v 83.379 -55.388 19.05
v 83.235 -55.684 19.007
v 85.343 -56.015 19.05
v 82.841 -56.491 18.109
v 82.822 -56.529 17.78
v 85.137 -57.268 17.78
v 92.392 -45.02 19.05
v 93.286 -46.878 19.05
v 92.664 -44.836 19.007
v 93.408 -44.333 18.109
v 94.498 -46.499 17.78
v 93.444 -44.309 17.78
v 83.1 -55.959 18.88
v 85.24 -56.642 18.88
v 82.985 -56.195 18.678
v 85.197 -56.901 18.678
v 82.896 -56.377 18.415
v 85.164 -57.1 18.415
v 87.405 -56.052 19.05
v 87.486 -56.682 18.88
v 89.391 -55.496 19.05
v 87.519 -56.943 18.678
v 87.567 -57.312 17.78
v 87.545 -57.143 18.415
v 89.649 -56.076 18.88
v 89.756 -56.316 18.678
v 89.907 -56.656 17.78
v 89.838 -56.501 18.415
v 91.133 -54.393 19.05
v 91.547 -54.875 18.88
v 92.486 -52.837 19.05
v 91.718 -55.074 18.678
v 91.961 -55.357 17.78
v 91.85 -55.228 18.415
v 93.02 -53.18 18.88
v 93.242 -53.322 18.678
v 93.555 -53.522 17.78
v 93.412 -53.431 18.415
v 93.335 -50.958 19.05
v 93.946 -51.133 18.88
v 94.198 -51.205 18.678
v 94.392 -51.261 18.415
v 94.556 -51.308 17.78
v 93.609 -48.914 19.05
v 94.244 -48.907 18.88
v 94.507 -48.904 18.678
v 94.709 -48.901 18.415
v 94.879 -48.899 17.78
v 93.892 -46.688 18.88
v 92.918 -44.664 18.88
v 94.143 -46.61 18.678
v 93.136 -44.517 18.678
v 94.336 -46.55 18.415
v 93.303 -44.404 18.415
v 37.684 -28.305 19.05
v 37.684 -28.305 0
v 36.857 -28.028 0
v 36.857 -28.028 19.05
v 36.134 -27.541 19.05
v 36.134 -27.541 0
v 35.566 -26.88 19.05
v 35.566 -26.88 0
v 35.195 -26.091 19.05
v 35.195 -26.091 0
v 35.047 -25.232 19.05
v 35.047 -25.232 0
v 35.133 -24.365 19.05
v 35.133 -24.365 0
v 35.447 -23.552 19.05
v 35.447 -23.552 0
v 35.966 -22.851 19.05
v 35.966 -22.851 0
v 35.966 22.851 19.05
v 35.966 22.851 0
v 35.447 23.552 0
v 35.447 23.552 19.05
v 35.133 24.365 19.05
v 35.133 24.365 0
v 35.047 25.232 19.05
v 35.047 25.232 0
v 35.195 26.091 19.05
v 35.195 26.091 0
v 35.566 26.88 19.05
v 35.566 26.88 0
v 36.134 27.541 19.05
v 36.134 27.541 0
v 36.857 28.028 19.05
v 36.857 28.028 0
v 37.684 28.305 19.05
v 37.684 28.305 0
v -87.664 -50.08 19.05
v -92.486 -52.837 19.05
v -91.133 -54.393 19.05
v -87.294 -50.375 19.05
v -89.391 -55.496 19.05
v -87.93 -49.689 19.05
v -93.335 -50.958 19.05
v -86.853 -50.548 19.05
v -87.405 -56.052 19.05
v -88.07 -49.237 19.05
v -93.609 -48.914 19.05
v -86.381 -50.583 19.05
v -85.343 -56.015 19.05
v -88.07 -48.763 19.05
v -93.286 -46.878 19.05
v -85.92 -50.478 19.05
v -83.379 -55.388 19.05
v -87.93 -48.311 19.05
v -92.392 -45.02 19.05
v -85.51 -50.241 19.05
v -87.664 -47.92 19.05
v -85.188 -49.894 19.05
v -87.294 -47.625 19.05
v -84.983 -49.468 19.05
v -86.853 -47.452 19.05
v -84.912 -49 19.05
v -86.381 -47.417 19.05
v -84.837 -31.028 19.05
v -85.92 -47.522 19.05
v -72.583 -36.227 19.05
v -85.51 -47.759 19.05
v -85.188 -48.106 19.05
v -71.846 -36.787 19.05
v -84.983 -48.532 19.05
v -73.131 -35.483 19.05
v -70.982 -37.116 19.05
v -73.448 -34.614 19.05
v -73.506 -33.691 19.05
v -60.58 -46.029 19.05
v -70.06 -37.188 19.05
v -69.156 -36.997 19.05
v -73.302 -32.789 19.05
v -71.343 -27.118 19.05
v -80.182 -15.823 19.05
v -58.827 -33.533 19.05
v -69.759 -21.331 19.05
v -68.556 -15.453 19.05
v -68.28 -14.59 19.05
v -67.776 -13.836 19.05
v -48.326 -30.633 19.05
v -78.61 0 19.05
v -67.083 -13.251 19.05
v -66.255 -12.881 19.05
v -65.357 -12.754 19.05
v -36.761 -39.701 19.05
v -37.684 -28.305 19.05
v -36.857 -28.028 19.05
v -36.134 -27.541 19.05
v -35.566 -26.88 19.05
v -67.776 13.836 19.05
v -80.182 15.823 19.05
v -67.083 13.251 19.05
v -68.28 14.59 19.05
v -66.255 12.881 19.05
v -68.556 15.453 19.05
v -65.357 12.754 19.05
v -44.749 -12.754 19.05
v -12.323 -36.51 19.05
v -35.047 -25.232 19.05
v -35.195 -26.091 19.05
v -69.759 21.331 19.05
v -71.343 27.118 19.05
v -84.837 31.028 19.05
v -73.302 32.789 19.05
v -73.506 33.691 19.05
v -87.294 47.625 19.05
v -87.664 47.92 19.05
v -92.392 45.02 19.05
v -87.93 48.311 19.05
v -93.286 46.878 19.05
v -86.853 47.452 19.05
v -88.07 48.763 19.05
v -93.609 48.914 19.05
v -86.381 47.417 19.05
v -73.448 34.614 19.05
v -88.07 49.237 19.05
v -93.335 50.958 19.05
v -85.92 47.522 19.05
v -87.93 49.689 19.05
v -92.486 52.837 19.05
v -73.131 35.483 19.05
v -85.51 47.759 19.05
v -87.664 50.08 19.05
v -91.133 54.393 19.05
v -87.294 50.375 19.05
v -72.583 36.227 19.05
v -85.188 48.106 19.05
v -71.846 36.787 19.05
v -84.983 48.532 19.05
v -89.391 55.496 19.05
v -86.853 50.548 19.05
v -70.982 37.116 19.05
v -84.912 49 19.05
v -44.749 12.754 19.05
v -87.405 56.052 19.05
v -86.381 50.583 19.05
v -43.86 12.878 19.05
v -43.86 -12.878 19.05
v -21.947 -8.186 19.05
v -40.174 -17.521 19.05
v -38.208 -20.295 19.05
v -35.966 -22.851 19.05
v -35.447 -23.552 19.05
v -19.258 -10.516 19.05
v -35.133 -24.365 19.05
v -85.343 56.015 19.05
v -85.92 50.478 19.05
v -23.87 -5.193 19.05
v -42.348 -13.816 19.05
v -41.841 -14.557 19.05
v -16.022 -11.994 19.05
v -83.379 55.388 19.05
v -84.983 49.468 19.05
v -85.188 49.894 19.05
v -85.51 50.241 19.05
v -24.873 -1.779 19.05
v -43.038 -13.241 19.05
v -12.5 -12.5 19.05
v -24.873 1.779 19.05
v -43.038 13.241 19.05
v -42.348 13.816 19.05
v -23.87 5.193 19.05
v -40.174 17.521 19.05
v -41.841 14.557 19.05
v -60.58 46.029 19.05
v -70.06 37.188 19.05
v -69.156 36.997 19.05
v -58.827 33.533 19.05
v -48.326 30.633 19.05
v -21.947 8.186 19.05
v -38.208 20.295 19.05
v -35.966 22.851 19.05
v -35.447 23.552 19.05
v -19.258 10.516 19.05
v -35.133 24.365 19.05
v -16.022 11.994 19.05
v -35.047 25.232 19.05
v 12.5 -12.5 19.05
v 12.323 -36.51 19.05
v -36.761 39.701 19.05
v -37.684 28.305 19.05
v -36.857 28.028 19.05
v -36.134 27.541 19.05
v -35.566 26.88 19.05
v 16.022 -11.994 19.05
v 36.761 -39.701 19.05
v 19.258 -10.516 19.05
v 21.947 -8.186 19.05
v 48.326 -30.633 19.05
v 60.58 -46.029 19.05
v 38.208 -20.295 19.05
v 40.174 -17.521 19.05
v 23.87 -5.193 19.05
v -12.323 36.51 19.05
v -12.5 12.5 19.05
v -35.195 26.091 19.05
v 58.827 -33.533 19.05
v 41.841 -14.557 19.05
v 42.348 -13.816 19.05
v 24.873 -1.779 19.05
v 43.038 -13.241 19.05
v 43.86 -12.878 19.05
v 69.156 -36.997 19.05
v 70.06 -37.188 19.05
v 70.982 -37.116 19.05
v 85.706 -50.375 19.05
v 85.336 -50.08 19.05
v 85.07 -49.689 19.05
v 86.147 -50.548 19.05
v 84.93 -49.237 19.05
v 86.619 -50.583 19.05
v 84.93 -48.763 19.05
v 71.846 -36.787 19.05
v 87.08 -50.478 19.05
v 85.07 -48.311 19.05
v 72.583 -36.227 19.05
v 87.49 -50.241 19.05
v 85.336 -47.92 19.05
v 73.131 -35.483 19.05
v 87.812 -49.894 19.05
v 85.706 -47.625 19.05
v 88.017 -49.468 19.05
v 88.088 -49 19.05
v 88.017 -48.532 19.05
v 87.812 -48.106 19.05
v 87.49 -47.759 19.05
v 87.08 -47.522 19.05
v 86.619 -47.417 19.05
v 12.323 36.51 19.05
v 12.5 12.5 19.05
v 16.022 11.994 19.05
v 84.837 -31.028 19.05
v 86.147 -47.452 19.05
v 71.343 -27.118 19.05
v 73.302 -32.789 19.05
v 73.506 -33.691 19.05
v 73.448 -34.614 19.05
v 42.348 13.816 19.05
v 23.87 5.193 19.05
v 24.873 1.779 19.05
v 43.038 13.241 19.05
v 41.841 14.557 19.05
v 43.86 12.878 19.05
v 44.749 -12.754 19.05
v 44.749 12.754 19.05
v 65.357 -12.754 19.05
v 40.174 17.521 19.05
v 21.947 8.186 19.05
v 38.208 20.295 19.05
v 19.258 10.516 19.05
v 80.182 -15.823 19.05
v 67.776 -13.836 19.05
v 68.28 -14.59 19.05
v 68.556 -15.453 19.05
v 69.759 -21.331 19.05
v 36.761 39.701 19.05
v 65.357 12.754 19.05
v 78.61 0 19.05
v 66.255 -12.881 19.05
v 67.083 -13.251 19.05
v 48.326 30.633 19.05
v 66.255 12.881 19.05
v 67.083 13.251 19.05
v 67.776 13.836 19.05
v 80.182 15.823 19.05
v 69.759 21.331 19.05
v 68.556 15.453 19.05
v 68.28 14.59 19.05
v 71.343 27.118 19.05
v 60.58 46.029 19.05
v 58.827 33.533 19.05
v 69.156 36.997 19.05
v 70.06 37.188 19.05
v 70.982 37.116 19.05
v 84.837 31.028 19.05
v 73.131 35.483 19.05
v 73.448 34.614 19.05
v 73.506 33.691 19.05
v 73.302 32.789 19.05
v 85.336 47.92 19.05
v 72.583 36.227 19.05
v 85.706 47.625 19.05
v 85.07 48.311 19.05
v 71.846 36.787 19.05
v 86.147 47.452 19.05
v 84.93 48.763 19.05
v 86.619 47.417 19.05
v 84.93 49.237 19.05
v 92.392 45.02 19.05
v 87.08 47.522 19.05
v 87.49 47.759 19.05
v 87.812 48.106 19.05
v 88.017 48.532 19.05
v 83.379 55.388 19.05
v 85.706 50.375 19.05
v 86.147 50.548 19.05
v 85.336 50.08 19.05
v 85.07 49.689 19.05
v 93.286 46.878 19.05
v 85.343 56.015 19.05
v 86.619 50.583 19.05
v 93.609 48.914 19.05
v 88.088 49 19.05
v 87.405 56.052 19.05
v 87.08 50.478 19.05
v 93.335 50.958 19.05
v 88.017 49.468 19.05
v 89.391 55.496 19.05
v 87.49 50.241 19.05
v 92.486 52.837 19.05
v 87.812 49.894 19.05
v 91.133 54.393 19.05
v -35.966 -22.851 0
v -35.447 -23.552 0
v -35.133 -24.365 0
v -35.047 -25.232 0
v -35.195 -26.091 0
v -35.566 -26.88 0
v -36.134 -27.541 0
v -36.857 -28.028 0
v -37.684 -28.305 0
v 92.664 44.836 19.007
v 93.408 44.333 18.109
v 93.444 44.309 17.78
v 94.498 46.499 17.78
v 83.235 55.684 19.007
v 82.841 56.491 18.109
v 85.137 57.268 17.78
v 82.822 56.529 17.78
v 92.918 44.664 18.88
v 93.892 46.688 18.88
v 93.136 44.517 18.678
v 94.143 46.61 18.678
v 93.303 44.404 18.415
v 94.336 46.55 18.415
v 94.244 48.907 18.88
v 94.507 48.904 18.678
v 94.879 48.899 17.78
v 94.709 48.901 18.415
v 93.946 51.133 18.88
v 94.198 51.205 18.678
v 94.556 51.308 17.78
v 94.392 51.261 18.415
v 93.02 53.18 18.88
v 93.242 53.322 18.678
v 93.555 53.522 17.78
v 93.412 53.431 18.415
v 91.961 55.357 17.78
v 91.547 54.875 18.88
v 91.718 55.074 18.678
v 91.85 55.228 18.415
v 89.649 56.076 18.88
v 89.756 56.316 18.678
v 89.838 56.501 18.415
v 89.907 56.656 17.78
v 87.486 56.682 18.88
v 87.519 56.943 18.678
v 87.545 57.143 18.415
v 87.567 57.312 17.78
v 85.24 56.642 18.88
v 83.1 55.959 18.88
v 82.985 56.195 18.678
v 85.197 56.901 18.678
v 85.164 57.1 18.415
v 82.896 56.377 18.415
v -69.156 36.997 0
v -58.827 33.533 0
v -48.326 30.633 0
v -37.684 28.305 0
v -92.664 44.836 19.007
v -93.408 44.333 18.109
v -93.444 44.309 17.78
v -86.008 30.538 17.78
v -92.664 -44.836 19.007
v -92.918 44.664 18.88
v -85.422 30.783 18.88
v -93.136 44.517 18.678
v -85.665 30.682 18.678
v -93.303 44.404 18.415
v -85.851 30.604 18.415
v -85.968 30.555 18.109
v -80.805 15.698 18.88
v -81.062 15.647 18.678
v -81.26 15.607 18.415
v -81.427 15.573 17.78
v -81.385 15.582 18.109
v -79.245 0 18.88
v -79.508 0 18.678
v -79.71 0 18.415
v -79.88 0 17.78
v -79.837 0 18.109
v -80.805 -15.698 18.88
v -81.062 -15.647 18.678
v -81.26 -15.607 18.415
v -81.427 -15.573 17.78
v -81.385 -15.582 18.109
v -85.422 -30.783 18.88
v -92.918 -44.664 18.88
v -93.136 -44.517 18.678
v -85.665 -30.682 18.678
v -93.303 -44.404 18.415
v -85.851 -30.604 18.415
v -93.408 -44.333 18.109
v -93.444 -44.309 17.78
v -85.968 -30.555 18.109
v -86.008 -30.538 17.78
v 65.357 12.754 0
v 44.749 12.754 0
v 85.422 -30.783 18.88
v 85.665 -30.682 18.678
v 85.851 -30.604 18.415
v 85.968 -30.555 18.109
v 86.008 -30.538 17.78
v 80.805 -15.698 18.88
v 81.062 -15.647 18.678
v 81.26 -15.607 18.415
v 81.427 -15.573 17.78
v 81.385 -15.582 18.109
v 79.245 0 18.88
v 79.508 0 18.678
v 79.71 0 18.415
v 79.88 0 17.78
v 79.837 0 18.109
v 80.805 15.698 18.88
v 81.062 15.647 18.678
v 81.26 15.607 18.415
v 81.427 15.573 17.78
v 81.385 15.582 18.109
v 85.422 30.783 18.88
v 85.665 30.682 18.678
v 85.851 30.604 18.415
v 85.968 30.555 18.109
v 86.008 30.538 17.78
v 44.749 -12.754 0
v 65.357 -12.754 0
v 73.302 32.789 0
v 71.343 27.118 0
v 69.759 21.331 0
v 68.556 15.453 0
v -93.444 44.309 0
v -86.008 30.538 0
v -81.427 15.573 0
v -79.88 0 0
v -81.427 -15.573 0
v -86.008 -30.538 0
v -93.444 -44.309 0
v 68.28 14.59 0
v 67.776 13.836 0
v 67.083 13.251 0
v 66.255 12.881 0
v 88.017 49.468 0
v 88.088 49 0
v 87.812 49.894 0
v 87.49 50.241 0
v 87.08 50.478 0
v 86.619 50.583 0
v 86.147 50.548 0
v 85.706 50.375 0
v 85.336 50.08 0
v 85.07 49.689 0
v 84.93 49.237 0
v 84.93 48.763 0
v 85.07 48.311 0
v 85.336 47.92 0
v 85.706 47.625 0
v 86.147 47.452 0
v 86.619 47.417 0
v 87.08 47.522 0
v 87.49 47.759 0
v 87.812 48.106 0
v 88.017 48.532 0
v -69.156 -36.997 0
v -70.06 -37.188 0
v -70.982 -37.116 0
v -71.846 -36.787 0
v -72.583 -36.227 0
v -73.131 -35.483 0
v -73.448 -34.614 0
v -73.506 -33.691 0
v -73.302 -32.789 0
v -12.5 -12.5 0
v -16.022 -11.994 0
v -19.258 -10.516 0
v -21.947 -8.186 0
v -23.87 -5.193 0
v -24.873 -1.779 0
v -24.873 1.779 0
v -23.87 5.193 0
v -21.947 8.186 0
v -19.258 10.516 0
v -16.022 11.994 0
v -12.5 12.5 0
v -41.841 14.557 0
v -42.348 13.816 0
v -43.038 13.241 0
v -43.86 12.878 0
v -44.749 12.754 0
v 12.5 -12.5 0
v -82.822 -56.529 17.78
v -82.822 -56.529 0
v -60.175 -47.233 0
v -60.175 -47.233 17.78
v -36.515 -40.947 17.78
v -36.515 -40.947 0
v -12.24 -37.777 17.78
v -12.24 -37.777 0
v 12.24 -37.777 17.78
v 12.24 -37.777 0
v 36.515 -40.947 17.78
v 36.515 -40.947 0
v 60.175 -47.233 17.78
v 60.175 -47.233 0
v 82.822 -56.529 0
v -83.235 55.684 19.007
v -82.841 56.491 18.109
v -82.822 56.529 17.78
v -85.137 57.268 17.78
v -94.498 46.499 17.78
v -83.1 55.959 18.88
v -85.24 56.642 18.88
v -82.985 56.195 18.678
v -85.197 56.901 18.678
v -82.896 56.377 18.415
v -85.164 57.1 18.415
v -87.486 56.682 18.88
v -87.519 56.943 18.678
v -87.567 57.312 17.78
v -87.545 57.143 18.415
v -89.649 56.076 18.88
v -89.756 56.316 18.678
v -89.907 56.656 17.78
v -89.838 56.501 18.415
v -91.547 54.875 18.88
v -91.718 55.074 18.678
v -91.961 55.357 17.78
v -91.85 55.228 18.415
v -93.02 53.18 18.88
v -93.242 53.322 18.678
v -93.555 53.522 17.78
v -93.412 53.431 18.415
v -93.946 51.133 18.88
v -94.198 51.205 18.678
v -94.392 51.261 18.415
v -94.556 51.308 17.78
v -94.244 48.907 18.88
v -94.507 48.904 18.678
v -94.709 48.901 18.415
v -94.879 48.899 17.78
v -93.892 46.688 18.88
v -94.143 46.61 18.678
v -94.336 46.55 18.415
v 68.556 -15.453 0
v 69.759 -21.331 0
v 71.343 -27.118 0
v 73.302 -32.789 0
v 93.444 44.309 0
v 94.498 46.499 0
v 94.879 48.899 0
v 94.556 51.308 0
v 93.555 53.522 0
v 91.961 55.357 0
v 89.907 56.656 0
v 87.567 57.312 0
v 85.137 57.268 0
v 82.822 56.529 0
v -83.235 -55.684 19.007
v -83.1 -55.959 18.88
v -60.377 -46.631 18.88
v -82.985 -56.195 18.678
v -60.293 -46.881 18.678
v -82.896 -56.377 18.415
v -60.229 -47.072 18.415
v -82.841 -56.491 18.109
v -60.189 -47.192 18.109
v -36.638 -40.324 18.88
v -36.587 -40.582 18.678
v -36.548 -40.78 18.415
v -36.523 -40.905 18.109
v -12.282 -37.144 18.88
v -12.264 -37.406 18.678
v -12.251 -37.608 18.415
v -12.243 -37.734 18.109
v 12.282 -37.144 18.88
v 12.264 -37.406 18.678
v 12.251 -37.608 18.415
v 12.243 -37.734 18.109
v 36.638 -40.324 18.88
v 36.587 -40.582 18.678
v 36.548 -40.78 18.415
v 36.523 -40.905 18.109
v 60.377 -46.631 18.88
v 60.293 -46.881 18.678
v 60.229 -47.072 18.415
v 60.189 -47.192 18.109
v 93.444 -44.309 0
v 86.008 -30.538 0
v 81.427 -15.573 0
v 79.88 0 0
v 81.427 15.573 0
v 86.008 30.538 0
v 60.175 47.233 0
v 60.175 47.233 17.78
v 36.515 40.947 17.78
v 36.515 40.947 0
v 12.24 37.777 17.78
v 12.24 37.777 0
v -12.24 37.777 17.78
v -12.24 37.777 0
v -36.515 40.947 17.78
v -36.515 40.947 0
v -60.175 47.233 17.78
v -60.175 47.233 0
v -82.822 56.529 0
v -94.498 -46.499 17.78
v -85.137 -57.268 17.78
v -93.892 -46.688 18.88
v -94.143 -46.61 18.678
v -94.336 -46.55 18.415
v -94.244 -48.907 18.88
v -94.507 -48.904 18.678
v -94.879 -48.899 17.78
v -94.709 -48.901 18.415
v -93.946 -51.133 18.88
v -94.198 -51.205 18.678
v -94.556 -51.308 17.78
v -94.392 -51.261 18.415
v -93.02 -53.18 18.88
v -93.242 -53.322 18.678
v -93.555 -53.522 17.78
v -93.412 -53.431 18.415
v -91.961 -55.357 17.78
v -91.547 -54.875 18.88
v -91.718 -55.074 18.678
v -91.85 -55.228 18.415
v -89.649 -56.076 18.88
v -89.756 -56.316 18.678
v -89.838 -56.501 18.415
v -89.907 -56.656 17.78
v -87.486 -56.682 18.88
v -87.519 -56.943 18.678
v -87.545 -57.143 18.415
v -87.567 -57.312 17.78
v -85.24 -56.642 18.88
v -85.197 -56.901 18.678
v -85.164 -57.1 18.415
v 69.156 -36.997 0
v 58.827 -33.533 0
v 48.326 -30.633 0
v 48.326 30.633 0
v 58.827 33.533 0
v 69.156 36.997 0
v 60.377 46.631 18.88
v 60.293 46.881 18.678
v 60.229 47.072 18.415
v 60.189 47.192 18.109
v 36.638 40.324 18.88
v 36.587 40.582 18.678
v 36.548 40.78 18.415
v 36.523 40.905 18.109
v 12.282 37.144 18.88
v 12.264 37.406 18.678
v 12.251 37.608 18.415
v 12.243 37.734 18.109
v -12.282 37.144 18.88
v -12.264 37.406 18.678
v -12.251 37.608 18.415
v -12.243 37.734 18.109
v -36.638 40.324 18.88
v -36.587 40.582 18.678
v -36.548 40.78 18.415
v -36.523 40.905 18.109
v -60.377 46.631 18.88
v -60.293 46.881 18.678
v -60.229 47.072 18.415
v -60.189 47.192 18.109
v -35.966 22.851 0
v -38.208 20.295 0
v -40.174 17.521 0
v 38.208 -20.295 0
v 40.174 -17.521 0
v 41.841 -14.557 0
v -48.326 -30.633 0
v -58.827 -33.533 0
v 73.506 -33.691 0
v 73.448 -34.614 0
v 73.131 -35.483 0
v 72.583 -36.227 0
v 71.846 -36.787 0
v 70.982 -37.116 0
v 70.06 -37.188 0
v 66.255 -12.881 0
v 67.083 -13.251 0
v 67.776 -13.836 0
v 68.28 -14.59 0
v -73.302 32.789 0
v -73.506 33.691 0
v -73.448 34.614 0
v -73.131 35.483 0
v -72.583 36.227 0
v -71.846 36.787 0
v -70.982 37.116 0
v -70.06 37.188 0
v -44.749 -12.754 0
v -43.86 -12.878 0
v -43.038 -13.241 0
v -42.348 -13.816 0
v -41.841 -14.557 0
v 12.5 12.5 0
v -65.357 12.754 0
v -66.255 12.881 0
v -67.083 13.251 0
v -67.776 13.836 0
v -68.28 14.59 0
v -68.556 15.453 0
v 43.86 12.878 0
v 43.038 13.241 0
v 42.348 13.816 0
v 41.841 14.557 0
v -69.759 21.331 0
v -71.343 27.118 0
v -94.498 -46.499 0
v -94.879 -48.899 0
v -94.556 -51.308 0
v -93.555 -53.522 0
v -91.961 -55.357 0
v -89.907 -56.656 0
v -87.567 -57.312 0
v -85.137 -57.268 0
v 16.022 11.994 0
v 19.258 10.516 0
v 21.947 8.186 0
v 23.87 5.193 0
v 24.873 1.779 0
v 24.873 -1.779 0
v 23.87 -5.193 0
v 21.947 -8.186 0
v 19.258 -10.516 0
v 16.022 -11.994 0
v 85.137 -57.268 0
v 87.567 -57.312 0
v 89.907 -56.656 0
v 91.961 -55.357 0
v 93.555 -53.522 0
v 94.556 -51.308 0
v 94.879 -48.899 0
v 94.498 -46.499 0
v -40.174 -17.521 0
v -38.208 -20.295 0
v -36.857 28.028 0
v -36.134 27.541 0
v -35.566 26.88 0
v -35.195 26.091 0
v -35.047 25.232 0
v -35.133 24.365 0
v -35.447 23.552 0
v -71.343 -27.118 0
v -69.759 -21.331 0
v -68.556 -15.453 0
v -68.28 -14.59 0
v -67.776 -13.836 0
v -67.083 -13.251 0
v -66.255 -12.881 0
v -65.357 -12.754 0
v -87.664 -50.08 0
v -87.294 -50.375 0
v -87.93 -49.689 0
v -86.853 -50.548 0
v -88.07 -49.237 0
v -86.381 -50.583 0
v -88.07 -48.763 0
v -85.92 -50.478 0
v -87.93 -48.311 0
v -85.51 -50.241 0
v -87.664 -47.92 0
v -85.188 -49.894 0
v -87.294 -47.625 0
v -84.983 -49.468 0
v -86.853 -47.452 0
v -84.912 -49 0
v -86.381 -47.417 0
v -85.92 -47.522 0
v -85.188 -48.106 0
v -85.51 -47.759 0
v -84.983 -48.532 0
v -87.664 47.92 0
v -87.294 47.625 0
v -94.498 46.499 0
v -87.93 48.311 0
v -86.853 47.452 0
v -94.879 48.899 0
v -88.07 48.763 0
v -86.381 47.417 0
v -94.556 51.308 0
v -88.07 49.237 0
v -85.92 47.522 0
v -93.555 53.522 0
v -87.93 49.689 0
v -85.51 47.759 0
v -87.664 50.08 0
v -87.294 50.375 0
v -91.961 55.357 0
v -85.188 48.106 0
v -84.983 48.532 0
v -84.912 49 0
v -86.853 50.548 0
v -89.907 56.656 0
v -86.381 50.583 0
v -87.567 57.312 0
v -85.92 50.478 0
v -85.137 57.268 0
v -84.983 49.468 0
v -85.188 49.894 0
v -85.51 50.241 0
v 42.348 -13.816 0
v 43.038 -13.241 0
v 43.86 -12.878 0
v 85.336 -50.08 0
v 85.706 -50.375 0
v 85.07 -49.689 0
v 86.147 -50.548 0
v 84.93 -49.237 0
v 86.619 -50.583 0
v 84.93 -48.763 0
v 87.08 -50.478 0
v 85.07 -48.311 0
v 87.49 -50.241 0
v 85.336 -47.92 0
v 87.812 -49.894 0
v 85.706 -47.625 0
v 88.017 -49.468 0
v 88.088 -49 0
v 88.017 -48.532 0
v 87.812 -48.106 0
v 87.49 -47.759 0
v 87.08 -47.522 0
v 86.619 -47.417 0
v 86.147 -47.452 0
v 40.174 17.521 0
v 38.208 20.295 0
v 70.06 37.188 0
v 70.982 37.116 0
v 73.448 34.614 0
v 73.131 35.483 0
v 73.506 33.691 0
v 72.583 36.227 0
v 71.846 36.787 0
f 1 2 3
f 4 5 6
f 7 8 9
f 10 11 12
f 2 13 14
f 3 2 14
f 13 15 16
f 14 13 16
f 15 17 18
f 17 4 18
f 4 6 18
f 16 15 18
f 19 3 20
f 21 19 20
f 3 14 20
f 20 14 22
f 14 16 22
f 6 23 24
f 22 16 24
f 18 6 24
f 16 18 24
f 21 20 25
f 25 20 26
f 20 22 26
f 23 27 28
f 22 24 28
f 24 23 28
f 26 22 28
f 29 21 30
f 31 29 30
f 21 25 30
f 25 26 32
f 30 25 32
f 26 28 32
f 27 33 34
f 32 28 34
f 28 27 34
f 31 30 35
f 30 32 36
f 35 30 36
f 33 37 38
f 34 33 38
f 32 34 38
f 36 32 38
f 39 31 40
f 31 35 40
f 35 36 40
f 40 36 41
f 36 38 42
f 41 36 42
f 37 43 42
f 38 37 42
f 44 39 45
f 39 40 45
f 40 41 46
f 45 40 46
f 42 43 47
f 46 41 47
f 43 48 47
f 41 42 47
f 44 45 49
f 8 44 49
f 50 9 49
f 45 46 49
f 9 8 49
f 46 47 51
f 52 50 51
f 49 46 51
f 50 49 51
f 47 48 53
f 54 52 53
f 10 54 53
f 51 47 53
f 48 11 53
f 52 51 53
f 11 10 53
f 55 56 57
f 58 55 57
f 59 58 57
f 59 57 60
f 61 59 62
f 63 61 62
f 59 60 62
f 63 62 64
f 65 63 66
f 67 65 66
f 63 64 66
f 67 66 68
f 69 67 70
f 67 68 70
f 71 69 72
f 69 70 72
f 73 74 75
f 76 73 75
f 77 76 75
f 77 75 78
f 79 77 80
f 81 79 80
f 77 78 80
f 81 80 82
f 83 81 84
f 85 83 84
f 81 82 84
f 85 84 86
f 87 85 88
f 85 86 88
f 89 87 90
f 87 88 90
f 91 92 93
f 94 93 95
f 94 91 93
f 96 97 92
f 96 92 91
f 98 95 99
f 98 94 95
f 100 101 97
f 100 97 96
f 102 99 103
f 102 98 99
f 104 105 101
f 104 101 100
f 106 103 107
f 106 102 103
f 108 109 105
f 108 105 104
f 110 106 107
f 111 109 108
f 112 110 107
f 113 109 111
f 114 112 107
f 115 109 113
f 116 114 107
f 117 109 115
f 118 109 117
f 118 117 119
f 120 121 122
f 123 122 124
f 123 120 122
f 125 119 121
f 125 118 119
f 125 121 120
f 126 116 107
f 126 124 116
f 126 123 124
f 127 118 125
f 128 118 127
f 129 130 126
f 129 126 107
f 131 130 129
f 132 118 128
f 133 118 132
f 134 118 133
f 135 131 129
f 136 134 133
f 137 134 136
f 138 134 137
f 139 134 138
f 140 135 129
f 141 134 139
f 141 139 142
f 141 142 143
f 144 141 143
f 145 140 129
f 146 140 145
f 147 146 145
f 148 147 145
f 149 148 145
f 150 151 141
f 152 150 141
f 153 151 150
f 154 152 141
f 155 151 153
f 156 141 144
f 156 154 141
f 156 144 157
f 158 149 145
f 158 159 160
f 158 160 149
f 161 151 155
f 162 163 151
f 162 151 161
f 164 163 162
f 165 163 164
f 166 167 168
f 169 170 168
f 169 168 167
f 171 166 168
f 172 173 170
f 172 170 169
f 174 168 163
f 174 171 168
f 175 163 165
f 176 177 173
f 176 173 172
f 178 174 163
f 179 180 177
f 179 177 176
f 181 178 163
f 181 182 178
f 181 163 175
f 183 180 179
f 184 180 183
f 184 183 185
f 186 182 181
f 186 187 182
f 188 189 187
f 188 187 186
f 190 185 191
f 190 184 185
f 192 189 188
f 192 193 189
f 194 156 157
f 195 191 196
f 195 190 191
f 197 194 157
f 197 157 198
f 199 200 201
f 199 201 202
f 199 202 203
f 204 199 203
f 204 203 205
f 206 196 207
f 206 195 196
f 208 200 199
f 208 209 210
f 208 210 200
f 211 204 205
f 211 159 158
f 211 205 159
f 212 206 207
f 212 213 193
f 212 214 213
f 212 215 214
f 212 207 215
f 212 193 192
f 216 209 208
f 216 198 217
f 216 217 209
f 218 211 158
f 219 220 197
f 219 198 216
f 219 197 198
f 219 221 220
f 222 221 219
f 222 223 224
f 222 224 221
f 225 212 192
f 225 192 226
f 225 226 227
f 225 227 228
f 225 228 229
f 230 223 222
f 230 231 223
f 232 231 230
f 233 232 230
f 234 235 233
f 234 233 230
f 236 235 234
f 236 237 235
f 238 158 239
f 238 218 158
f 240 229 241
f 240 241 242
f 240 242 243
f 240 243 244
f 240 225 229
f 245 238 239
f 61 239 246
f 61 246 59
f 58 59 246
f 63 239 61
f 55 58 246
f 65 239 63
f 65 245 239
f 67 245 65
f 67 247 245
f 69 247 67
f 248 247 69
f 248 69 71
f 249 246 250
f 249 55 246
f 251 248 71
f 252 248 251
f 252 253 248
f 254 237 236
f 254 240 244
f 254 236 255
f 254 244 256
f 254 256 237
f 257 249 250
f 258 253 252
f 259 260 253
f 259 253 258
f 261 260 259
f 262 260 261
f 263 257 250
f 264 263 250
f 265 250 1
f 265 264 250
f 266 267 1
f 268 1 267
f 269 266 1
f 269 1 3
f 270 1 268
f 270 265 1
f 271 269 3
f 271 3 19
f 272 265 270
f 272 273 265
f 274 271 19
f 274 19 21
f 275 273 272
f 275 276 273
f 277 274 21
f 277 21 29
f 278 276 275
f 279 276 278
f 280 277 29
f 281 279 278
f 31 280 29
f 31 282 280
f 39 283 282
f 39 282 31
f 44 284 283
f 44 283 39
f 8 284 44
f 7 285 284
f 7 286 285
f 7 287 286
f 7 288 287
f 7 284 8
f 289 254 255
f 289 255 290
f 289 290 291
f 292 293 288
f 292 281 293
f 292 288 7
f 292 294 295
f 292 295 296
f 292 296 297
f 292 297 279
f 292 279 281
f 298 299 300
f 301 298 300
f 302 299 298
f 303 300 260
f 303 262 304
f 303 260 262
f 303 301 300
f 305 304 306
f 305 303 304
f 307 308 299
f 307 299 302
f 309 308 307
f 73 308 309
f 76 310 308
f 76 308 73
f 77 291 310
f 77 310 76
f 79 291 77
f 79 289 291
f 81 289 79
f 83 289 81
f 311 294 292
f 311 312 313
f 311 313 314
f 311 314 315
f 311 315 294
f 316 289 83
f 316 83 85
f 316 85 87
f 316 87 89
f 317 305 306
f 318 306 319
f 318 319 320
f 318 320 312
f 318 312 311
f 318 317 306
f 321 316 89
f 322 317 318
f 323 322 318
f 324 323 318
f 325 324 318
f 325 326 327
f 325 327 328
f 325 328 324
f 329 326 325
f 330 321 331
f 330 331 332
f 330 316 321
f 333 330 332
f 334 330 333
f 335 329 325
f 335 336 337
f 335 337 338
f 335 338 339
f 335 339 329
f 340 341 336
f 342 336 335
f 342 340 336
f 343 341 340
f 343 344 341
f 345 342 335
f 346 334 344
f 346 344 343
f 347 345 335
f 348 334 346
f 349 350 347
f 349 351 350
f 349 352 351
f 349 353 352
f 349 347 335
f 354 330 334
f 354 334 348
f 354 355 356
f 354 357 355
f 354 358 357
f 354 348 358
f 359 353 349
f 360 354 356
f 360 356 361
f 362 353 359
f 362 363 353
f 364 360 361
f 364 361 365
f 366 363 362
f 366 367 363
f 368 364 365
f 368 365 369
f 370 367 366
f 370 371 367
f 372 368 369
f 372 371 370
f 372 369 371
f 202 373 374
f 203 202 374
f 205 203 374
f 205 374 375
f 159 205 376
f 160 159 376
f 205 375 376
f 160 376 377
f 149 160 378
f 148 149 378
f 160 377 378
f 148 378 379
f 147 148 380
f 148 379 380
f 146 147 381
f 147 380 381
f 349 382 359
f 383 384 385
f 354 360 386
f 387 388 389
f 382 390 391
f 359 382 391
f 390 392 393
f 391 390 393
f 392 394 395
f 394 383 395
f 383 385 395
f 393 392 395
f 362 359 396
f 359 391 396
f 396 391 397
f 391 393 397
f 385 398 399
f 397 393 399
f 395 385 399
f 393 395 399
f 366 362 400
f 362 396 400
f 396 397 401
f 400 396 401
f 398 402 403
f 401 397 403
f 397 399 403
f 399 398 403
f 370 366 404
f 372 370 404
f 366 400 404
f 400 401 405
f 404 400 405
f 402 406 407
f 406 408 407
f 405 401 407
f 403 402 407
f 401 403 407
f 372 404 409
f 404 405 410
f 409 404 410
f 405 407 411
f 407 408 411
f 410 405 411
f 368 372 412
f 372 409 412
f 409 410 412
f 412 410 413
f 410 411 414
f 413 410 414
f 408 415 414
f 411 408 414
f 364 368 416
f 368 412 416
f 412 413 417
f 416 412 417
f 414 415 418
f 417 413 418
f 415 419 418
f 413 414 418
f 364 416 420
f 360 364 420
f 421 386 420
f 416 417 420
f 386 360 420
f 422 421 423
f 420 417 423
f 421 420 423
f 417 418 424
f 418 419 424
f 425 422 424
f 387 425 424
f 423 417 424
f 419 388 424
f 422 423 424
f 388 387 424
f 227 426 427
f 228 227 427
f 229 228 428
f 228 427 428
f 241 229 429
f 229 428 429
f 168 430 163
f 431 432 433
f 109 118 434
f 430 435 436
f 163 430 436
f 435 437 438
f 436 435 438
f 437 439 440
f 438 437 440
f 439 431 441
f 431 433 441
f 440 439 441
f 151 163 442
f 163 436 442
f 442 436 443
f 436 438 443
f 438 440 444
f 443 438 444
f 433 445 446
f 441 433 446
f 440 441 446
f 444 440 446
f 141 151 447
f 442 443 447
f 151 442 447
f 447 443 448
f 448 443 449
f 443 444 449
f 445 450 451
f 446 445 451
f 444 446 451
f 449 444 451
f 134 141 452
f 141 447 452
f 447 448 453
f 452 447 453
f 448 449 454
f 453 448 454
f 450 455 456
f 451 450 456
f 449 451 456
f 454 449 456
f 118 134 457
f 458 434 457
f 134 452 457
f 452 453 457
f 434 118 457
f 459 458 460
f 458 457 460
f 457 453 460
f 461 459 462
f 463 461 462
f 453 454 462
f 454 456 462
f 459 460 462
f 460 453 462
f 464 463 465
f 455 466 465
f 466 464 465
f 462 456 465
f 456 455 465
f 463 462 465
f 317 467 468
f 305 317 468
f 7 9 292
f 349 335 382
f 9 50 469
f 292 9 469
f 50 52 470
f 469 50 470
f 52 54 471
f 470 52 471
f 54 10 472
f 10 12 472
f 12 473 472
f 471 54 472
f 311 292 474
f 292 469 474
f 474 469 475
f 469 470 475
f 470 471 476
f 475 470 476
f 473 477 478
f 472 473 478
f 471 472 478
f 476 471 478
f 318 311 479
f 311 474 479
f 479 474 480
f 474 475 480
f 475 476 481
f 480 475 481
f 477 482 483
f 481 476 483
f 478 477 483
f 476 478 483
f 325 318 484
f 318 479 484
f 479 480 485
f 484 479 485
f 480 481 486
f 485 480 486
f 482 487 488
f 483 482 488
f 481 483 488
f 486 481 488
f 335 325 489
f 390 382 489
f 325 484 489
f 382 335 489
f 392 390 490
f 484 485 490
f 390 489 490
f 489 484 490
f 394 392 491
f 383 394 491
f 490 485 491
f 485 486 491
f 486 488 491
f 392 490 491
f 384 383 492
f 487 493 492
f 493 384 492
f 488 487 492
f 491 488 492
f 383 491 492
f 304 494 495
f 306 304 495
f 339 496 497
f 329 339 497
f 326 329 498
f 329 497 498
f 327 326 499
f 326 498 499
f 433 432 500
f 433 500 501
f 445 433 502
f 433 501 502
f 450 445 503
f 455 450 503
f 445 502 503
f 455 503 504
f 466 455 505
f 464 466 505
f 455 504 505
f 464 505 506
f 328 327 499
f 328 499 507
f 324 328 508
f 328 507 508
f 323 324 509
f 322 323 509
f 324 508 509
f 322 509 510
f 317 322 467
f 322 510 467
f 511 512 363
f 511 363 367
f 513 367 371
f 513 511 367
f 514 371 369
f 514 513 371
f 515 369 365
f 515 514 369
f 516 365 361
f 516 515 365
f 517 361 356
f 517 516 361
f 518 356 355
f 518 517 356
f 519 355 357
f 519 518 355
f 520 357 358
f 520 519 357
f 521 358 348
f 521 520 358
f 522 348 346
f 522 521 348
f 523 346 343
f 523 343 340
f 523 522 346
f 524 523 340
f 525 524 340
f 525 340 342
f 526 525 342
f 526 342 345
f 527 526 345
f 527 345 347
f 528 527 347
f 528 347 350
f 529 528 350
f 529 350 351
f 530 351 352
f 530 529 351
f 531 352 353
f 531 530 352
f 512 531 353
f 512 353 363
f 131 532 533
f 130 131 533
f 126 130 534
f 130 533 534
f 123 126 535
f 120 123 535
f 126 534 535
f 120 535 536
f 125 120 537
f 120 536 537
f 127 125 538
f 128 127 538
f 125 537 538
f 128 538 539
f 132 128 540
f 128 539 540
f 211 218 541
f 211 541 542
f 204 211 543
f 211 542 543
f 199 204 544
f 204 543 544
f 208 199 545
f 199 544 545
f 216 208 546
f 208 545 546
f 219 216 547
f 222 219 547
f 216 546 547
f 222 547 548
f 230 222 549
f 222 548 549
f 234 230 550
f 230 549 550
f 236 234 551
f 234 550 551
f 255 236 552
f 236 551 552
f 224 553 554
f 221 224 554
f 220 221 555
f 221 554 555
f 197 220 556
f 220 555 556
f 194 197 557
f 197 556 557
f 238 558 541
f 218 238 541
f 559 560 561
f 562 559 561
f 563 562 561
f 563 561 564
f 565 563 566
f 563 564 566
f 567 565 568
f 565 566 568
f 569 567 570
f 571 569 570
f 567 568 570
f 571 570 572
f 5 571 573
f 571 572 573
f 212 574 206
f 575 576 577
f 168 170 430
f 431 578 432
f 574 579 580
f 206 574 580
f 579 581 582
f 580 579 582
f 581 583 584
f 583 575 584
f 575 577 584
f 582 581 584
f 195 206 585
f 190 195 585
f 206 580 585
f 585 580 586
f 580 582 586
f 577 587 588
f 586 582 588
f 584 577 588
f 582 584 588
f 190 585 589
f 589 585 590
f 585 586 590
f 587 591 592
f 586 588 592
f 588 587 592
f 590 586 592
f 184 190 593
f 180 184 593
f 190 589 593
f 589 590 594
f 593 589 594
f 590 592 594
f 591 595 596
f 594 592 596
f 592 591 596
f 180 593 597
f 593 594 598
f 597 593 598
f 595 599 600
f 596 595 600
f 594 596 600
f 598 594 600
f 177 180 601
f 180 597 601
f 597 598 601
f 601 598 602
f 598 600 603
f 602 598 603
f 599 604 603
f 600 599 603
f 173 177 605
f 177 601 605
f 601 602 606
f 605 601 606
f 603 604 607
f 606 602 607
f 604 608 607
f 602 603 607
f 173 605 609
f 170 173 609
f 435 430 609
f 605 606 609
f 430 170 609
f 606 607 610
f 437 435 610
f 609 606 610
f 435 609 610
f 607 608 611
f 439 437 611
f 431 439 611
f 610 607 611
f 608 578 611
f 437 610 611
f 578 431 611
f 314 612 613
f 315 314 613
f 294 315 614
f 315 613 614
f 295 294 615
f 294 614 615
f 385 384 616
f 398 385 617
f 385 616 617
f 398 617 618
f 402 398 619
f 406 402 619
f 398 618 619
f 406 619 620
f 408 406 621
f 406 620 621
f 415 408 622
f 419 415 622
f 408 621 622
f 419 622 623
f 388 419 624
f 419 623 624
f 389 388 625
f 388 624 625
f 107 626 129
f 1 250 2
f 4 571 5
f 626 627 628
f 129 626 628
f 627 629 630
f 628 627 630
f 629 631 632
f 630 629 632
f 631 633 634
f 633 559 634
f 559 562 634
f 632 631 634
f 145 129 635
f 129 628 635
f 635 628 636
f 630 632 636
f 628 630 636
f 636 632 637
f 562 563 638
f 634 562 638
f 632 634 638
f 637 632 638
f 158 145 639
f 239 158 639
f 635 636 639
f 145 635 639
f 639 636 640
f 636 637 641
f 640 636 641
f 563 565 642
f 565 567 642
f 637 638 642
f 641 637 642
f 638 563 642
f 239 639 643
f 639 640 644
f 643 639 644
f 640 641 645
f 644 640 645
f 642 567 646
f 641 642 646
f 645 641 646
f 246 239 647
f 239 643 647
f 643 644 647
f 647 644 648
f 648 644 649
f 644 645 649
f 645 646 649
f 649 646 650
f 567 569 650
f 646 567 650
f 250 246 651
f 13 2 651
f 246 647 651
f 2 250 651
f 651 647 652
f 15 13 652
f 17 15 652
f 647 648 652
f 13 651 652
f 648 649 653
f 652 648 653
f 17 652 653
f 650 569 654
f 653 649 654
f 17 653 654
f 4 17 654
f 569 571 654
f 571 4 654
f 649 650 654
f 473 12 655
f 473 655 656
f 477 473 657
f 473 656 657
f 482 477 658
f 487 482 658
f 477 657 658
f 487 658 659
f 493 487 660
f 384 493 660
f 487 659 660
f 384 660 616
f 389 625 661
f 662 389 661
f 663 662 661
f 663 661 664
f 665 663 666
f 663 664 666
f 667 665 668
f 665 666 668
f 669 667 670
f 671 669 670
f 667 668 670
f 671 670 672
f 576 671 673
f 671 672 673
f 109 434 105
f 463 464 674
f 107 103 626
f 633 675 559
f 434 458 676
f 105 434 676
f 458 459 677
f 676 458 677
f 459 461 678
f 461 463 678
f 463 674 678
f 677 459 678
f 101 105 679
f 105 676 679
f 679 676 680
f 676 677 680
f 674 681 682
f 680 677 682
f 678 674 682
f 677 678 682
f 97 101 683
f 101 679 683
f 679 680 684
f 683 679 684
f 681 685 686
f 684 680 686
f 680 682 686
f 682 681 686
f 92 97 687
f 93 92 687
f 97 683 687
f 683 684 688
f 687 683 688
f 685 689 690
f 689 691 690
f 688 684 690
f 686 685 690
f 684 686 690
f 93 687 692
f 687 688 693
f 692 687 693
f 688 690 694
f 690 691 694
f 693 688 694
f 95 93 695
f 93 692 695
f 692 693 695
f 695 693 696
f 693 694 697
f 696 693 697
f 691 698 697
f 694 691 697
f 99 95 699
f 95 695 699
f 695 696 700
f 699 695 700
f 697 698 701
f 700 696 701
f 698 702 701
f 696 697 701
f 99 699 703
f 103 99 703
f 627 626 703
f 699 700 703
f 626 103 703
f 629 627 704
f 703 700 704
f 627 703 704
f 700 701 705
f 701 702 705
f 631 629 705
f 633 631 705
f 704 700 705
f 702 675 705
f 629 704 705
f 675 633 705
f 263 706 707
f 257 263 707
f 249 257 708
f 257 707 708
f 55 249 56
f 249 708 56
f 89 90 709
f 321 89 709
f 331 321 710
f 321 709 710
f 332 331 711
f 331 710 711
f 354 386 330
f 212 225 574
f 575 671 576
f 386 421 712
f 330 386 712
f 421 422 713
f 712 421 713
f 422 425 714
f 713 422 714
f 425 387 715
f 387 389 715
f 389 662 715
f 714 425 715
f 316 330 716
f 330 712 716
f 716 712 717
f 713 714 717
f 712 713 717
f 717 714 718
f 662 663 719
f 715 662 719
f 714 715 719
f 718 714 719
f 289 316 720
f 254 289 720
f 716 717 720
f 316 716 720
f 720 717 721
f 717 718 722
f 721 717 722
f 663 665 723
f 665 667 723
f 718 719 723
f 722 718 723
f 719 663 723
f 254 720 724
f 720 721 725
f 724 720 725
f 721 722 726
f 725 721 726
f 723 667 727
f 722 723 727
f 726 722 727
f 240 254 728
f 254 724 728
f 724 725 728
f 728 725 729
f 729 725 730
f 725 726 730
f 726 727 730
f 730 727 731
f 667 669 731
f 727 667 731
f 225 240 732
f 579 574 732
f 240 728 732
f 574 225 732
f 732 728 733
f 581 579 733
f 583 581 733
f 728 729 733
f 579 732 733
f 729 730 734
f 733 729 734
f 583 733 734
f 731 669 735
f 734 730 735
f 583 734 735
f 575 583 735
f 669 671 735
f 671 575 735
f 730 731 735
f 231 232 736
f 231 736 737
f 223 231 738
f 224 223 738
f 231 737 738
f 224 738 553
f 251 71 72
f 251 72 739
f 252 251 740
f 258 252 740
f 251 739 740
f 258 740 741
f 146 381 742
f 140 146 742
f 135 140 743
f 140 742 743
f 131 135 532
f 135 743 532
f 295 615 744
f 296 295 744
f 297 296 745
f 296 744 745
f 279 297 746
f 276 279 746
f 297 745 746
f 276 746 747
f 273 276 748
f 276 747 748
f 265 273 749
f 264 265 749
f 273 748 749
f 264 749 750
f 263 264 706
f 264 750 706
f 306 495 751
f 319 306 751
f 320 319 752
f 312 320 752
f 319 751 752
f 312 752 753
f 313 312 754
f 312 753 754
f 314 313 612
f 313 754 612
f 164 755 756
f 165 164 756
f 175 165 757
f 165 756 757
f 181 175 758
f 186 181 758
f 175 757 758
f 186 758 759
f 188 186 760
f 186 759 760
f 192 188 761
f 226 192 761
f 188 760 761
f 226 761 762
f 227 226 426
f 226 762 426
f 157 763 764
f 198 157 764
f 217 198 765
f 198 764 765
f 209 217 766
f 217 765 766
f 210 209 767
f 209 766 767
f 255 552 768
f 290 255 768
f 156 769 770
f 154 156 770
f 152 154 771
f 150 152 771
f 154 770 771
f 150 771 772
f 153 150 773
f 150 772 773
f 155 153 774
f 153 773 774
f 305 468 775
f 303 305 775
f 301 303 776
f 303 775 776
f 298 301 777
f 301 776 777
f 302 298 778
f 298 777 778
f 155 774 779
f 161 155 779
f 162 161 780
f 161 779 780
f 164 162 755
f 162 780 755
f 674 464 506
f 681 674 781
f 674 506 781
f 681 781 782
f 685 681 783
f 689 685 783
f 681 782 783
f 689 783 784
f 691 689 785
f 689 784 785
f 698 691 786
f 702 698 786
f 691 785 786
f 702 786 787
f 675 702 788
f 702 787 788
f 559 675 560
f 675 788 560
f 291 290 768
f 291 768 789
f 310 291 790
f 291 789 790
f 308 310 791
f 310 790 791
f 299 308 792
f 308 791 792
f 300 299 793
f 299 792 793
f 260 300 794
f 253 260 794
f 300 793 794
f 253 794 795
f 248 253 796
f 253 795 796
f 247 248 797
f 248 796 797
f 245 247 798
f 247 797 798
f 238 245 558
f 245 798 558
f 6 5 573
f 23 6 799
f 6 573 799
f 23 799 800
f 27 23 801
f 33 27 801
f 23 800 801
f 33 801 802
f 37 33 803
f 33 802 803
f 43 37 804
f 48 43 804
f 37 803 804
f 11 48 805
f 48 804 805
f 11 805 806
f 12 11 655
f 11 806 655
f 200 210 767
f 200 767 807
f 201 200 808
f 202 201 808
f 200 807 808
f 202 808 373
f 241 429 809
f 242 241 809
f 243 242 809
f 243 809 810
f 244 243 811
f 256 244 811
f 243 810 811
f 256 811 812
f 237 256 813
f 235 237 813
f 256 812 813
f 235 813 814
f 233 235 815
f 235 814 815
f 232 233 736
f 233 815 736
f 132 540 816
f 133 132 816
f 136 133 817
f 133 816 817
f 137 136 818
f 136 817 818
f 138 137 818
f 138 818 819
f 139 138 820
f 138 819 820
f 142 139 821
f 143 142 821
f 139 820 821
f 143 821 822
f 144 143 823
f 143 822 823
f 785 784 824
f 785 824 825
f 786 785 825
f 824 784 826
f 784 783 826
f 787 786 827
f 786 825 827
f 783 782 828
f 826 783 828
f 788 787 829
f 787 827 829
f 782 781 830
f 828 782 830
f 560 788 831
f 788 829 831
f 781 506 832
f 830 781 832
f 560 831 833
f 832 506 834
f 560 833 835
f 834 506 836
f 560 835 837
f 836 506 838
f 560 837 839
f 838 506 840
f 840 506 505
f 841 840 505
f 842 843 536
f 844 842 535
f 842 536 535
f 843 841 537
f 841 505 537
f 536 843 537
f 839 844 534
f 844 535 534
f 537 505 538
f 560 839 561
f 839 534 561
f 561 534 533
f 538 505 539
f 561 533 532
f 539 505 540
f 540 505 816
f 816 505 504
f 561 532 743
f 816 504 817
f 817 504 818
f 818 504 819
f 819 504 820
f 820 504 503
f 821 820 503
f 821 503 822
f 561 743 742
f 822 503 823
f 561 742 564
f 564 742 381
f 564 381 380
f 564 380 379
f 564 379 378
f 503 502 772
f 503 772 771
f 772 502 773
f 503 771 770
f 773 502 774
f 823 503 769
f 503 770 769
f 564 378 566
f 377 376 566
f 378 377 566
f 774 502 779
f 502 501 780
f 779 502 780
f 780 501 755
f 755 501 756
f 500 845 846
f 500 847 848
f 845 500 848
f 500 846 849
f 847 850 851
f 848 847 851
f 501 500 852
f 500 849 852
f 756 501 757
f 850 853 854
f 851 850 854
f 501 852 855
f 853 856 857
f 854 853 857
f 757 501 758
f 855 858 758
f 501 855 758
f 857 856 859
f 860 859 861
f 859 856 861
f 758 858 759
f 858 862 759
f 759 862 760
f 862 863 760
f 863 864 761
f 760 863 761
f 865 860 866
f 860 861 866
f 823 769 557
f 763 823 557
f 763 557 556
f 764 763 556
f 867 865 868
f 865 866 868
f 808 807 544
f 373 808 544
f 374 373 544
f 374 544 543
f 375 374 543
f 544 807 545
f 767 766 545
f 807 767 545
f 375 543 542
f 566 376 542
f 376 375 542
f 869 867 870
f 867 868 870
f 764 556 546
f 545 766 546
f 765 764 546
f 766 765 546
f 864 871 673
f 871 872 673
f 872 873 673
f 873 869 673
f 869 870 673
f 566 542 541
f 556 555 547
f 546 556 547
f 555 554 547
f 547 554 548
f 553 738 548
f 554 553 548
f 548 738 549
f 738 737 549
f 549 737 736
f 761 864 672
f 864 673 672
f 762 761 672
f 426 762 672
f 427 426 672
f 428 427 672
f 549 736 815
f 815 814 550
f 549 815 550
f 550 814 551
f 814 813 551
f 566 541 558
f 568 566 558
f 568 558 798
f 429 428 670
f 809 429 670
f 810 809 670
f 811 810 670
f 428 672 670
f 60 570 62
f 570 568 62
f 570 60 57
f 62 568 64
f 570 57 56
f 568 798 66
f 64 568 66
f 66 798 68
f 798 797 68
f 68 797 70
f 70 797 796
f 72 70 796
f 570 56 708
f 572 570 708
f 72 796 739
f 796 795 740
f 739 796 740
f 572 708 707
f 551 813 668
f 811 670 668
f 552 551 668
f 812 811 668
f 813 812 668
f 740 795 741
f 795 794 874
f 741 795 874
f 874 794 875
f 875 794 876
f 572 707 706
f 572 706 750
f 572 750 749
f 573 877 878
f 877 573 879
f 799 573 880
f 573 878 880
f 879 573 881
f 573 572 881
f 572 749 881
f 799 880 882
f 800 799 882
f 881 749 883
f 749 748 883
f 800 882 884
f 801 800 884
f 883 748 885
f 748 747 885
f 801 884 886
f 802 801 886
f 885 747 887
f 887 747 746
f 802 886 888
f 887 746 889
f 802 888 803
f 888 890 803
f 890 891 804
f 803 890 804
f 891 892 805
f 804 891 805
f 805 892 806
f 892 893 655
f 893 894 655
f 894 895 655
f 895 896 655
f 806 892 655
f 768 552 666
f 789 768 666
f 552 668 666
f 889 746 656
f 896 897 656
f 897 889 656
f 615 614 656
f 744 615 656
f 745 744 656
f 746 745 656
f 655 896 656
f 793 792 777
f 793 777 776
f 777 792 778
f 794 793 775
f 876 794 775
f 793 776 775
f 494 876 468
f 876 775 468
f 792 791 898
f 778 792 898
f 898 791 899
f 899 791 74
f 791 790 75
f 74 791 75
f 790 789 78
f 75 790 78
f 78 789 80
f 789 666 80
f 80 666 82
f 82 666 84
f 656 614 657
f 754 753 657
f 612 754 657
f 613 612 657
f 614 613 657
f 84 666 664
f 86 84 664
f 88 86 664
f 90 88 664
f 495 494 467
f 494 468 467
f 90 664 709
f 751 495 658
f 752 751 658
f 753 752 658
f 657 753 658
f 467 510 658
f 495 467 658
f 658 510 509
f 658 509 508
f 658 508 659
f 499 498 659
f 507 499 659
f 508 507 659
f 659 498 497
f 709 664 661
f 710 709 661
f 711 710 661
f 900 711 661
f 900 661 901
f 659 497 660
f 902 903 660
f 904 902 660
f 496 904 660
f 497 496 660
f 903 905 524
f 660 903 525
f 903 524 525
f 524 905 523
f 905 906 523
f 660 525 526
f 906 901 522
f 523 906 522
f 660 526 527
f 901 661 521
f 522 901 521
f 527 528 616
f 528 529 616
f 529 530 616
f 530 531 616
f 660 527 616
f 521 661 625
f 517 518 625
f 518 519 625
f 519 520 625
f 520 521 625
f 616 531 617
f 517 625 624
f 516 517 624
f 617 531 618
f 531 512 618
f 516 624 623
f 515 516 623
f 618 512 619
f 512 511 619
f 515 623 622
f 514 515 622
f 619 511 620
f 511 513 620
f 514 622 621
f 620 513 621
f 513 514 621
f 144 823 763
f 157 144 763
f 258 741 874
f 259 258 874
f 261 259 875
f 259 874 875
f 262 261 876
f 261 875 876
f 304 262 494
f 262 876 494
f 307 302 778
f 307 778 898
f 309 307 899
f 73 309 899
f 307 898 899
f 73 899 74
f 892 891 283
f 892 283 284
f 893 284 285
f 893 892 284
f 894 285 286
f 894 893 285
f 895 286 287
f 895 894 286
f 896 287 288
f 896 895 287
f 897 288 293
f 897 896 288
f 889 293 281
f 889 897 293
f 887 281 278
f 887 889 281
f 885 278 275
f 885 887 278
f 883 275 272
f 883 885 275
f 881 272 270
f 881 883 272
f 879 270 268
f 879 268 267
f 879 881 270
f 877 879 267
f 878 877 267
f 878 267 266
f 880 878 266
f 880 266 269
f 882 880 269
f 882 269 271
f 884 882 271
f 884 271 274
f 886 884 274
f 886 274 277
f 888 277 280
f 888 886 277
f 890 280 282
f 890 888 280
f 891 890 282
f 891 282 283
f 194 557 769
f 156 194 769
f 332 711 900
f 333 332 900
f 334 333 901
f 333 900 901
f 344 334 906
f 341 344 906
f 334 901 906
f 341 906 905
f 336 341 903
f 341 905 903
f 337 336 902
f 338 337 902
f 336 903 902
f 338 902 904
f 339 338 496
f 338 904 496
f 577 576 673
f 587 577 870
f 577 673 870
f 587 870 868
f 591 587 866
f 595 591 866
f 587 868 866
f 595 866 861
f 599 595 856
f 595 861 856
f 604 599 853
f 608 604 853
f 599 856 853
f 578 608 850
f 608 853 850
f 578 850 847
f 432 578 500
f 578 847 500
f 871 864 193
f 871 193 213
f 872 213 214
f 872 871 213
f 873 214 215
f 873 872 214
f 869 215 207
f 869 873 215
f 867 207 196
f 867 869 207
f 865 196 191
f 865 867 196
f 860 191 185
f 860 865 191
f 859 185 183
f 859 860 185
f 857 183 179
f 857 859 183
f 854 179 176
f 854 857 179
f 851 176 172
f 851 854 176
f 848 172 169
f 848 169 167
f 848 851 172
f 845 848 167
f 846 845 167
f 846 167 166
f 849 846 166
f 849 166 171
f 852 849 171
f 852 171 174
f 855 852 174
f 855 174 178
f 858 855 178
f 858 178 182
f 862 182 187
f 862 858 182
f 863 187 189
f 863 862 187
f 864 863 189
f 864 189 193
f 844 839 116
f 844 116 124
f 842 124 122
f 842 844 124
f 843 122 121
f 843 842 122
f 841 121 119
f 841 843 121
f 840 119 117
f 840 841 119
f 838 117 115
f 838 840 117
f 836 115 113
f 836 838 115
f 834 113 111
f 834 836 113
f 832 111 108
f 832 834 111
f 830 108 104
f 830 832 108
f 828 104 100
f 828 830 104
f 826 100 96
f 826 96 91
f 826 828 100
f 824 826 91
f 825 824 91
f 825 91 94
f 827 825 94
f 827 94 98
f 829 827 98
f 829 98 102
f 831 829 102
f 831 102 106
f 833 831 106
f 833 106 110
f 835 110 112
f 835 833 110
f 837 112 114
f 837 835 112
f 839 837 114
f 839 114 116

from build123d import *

# Parameters (mm, degrees)
F0_R     = 1.5875
F1_DEPTH = 19.05
F0_R_2   = 3.175
F2_DEPTH = 6.35
F3_R     = 1.27


with BuildPart() as f1:
    # F0 (on Top) → F1 (new body)
    with BuildSketch(Plane.XY):
        with BuildLine():
            ThreePointArc((82.8215071839, 56.5294814298), (0, 37.38), (-82.8215071839, 56.5294814298))
            ThreePointArc((-82.8215071839, 56.5294814298), (-92.8246316261, 54.4975844509), (-93.4439756283, 44.3089870526))
            ThreePointArc((-93.4439756283, 44.3089870526), (-79.88, 0), (-93.4439756283, -44.3089870526))
            ThreePointArc((-93.4439756283, -44.3089870526), (-92.8246316261, -54.4975844509), (-82.8215071839, -56.5294814298))
            ThreePointArc((-82.8215071839, -56.5294814298), (0, -37.38), (82.8215071839, -56.5294814298))
            ThreePointArc((82.8215071839, -56.5294814298), (92.8246316261, -54.4975844509), (93.4439756283, -44.3089870526))
            ThreePointArc((93.4439756283, -44.3089870526), (79.88, 0), (93.4439756283, 44.3089870526))
            ThreePointArc((93.4439756283, 44.3089870526), (92.8246316261, 54.4975844509), (82.8215071839, 56.5294814298))
        make_face()
        with Locations((-86.5, -49)):
            Circle(F0_R, mode=Mode.SUBTRACT)
        with BuildLine():
            ThreePointArc((-44.7490329893, -12.754), (-43.0382407412, -13.2414304642), (-41.8412453259, -14.557333405))
            ThreePointArc((-41.8412453259, -14.557333405), (-39.2272080278, -18.9335940639), (-35.965811948, -22.8512647956))
            ThreePointArc((-35.965811948, -22.8512647956), (-35.1953196756, -26.0911928639), (-37.6837042763, -28.304501317))
            ThreePointArc((-37.6837042763, -28.304501317), (-53.5961461859, -32.0117479156), (-69.1555424288, -36.9971940769))
            ThreePointArc((-69.1555424288, -36.9971940769), (-72.5826288572, -36.2271539786), (-73.3024493232, -32.7891688656))
            ThreePointArc((-73.3024493232, -32.7891688656), (-70.5039949655, -24.2377869494), (-68.556245082, -15.4534970032))
            ThreePointArc((-68.556245082, -15.4534970032), (-67.4497325668, -13.5190259244), (-65.356580963, -12.754))
            Line((-65.356580963, -12.754), (-44.7490329893, -12.754))
        make_face(mode=Mode.SUBTRACT)
        with Locations((86.5, -49)):
            Circle(F0_R, mode=Mode.SUBTRACT)
        with BuildLine():
            ThreePointArc((-12.5, -12.5), (-25, 0), (-12.5, 12.5))
            Line((-12.5, 12.5), (12.5, 12.5))
            ThreePointArc((12.5, 12.5), (25, 0), (12.5, -12.5))
            Line((12.5, -12.5), (-12.5, -12.5))
        make_face(mode=Mode.SUBTRACT)
        with BuildLine():
            ThreePointArc((65.356580963, -12.754), (67.4497325668, -13.5190259244), (68.556245082, -15.4534970032))
            ThreePointArc((68.556245082, -15.4534970032), (70.5039949655, -24.2377869494), (73.3024493232, -32.7891688656))
            ThreePointArc((73.3024493232, -32.7891688656), (72.5826288572, -36.2271539786), (69.1555424288, -36.9971940769))
            ThreePointArc((69.1555424288, -36.9971940769), (53.5961461859, -32.0117479156), (37.6837042763, -28.304501317))
            ThreePointArc((37.6837042763, -28.304501317), (35.1953196756, -26.0911928639), (35.965811948, -22.8512647956))
            ThreePointArc((35.965811948, -22.8512647956), (39.2272080278, -18.9335940639), (41.8412453259, -14.557333405))
            ThreePointArc((41.8412453259, -14.557333405), (43.0382407412, -13.2414304642), (44.7490329893, -12.754))
            Line((44.7490329893, -12.754), (65.356580963, -12.754))
        make_face(mode=Mode.SUBTRACT)
        with BuildLine():
            ThreePointArc((-73.3024493232, 32.7891688656), (-72.5826288572, 36.2271539786), (-69.1555424288, 36.9971940769))
            ThreePointArc((-69.1555424288, 36.9971940769), (-53.5961461859, 32.0117479156), (-37.6837042763, 28.304501317))
            ThreePointArc((-37.6837042763, 28.304501317), (-35.1953196756, 26.0911928639), (-35.965811948, 22.8512647956))
            ThreePointArc((-35.965811948, 22.8512647956), (-39.2272080278, 18.9335940639), (-41.8412453259, 14.557333405))
            ThreePointArc((-41.8412453259, 14.557333405), (-43.0382407412, 13.2414304642), (-44.7490329893, 12.754))
            Line((-44.7490329893, 12.754), (-65.356580963, 12.754))
            ThreePointArc((-65.356580963, 12.754), (-67.4497325668, 13.5190259244), (-68.556245082, 15.4534970032))
            ThreePointArc((-68.556245082, 15.4534970032), (-70.5039949655, 24.2377869494), (-73.3024493232, 32.7891688656))
        make_face(mode=Mode.SUBTRACT)
        with Locations((-86.5, 49)):
            Circle(F0_R, mode=Mode.SUBTRACT)
        with BuildLine():
            ThreePointArc((35.965811948, 22.8512647956), (35.1953196756, 26.0911928639), (37.6837042763, 28.304501317))
            ThreePointArc((37.6837042763, 28.304501317), (53.5961461859, 32.0117479156), (69.1555424288, 36.9971940769))
            ThreePointArc((69.1555424288, 36.9971940769), (72.5826288572, 36.2271539786), (73.3024493232, 32.7891688656))
            ThreePointArc((73.3024493232, 32.7891688656), (70.5039949655, 24.2377869494), (68.556245082, 15.4534970032))
            ThreePointArc((68.556245082, 15.4534970032), (67.4497325668, 13.5190259244), (65.356580963, 12.754))
            Line((65.356580963, 12.754), (44.7490329893, 12.754))
            ThreePointArc((44.7490329893, 12.754), (43.0382407412, 13.2414304642), (41.8412453259, 14.557333405))
            ThreePointArc((41.8412453259, 14.557333405), (39.2272080278, 18.9335940639), (35.965811948, 22.8512647956))
        make_face(mode=Mode.SUBTRACT)
        with Locations((86.5, 49)):
            Circle(F0_R, mode=Mode.SUBTRACT)
    extrude(amount=F1_DEPTH)

    # F0 (on Top) → F2 (cut)
    with BuildSketch(Plane.XY):
        with BuildLine():
            Line((12.5, 12.5), (-12.5, 12.5))
            ThreePointArc((-12.5, 12.5), (-25, 0), (-12.5, -12.5))
            Line((-12.5, -12.5), (12.5, -12.5))
            ThreePointArc((12.5, -12.5), (25, 0), (12.5, 12.5))
        make_face()
        with Locations((-12.5, 0)):
            Circle(F0_R_2, mode=Mode.SUBTRACT)
        with Locations((12.5, 0)):
            Circle(F0_R_2, mode=Mode.SUBTRACT)
    extrude(amount=F2_DEPTH, mode=Mode.SUBTRACT)

    # F3
    f3_edges = [f1.edges().sort_by_distance(p)[0] for p in [
        (-79.88, 0, 19.05),
        (-92.824632, -54.497584, 19.05),
        (0, -37.38, 19.05),
        (92.824632, -54.497584, 19.05),
        (79.88, 0, 19.05),
        (92.824632, 54.497584, 19.05),
        (0, 37.38, 19.05),
        (-92.824632, 54.497584, 19.05),
    ]]
    fillet(f3_edges, radius=F3_R)


solid = f1.part
